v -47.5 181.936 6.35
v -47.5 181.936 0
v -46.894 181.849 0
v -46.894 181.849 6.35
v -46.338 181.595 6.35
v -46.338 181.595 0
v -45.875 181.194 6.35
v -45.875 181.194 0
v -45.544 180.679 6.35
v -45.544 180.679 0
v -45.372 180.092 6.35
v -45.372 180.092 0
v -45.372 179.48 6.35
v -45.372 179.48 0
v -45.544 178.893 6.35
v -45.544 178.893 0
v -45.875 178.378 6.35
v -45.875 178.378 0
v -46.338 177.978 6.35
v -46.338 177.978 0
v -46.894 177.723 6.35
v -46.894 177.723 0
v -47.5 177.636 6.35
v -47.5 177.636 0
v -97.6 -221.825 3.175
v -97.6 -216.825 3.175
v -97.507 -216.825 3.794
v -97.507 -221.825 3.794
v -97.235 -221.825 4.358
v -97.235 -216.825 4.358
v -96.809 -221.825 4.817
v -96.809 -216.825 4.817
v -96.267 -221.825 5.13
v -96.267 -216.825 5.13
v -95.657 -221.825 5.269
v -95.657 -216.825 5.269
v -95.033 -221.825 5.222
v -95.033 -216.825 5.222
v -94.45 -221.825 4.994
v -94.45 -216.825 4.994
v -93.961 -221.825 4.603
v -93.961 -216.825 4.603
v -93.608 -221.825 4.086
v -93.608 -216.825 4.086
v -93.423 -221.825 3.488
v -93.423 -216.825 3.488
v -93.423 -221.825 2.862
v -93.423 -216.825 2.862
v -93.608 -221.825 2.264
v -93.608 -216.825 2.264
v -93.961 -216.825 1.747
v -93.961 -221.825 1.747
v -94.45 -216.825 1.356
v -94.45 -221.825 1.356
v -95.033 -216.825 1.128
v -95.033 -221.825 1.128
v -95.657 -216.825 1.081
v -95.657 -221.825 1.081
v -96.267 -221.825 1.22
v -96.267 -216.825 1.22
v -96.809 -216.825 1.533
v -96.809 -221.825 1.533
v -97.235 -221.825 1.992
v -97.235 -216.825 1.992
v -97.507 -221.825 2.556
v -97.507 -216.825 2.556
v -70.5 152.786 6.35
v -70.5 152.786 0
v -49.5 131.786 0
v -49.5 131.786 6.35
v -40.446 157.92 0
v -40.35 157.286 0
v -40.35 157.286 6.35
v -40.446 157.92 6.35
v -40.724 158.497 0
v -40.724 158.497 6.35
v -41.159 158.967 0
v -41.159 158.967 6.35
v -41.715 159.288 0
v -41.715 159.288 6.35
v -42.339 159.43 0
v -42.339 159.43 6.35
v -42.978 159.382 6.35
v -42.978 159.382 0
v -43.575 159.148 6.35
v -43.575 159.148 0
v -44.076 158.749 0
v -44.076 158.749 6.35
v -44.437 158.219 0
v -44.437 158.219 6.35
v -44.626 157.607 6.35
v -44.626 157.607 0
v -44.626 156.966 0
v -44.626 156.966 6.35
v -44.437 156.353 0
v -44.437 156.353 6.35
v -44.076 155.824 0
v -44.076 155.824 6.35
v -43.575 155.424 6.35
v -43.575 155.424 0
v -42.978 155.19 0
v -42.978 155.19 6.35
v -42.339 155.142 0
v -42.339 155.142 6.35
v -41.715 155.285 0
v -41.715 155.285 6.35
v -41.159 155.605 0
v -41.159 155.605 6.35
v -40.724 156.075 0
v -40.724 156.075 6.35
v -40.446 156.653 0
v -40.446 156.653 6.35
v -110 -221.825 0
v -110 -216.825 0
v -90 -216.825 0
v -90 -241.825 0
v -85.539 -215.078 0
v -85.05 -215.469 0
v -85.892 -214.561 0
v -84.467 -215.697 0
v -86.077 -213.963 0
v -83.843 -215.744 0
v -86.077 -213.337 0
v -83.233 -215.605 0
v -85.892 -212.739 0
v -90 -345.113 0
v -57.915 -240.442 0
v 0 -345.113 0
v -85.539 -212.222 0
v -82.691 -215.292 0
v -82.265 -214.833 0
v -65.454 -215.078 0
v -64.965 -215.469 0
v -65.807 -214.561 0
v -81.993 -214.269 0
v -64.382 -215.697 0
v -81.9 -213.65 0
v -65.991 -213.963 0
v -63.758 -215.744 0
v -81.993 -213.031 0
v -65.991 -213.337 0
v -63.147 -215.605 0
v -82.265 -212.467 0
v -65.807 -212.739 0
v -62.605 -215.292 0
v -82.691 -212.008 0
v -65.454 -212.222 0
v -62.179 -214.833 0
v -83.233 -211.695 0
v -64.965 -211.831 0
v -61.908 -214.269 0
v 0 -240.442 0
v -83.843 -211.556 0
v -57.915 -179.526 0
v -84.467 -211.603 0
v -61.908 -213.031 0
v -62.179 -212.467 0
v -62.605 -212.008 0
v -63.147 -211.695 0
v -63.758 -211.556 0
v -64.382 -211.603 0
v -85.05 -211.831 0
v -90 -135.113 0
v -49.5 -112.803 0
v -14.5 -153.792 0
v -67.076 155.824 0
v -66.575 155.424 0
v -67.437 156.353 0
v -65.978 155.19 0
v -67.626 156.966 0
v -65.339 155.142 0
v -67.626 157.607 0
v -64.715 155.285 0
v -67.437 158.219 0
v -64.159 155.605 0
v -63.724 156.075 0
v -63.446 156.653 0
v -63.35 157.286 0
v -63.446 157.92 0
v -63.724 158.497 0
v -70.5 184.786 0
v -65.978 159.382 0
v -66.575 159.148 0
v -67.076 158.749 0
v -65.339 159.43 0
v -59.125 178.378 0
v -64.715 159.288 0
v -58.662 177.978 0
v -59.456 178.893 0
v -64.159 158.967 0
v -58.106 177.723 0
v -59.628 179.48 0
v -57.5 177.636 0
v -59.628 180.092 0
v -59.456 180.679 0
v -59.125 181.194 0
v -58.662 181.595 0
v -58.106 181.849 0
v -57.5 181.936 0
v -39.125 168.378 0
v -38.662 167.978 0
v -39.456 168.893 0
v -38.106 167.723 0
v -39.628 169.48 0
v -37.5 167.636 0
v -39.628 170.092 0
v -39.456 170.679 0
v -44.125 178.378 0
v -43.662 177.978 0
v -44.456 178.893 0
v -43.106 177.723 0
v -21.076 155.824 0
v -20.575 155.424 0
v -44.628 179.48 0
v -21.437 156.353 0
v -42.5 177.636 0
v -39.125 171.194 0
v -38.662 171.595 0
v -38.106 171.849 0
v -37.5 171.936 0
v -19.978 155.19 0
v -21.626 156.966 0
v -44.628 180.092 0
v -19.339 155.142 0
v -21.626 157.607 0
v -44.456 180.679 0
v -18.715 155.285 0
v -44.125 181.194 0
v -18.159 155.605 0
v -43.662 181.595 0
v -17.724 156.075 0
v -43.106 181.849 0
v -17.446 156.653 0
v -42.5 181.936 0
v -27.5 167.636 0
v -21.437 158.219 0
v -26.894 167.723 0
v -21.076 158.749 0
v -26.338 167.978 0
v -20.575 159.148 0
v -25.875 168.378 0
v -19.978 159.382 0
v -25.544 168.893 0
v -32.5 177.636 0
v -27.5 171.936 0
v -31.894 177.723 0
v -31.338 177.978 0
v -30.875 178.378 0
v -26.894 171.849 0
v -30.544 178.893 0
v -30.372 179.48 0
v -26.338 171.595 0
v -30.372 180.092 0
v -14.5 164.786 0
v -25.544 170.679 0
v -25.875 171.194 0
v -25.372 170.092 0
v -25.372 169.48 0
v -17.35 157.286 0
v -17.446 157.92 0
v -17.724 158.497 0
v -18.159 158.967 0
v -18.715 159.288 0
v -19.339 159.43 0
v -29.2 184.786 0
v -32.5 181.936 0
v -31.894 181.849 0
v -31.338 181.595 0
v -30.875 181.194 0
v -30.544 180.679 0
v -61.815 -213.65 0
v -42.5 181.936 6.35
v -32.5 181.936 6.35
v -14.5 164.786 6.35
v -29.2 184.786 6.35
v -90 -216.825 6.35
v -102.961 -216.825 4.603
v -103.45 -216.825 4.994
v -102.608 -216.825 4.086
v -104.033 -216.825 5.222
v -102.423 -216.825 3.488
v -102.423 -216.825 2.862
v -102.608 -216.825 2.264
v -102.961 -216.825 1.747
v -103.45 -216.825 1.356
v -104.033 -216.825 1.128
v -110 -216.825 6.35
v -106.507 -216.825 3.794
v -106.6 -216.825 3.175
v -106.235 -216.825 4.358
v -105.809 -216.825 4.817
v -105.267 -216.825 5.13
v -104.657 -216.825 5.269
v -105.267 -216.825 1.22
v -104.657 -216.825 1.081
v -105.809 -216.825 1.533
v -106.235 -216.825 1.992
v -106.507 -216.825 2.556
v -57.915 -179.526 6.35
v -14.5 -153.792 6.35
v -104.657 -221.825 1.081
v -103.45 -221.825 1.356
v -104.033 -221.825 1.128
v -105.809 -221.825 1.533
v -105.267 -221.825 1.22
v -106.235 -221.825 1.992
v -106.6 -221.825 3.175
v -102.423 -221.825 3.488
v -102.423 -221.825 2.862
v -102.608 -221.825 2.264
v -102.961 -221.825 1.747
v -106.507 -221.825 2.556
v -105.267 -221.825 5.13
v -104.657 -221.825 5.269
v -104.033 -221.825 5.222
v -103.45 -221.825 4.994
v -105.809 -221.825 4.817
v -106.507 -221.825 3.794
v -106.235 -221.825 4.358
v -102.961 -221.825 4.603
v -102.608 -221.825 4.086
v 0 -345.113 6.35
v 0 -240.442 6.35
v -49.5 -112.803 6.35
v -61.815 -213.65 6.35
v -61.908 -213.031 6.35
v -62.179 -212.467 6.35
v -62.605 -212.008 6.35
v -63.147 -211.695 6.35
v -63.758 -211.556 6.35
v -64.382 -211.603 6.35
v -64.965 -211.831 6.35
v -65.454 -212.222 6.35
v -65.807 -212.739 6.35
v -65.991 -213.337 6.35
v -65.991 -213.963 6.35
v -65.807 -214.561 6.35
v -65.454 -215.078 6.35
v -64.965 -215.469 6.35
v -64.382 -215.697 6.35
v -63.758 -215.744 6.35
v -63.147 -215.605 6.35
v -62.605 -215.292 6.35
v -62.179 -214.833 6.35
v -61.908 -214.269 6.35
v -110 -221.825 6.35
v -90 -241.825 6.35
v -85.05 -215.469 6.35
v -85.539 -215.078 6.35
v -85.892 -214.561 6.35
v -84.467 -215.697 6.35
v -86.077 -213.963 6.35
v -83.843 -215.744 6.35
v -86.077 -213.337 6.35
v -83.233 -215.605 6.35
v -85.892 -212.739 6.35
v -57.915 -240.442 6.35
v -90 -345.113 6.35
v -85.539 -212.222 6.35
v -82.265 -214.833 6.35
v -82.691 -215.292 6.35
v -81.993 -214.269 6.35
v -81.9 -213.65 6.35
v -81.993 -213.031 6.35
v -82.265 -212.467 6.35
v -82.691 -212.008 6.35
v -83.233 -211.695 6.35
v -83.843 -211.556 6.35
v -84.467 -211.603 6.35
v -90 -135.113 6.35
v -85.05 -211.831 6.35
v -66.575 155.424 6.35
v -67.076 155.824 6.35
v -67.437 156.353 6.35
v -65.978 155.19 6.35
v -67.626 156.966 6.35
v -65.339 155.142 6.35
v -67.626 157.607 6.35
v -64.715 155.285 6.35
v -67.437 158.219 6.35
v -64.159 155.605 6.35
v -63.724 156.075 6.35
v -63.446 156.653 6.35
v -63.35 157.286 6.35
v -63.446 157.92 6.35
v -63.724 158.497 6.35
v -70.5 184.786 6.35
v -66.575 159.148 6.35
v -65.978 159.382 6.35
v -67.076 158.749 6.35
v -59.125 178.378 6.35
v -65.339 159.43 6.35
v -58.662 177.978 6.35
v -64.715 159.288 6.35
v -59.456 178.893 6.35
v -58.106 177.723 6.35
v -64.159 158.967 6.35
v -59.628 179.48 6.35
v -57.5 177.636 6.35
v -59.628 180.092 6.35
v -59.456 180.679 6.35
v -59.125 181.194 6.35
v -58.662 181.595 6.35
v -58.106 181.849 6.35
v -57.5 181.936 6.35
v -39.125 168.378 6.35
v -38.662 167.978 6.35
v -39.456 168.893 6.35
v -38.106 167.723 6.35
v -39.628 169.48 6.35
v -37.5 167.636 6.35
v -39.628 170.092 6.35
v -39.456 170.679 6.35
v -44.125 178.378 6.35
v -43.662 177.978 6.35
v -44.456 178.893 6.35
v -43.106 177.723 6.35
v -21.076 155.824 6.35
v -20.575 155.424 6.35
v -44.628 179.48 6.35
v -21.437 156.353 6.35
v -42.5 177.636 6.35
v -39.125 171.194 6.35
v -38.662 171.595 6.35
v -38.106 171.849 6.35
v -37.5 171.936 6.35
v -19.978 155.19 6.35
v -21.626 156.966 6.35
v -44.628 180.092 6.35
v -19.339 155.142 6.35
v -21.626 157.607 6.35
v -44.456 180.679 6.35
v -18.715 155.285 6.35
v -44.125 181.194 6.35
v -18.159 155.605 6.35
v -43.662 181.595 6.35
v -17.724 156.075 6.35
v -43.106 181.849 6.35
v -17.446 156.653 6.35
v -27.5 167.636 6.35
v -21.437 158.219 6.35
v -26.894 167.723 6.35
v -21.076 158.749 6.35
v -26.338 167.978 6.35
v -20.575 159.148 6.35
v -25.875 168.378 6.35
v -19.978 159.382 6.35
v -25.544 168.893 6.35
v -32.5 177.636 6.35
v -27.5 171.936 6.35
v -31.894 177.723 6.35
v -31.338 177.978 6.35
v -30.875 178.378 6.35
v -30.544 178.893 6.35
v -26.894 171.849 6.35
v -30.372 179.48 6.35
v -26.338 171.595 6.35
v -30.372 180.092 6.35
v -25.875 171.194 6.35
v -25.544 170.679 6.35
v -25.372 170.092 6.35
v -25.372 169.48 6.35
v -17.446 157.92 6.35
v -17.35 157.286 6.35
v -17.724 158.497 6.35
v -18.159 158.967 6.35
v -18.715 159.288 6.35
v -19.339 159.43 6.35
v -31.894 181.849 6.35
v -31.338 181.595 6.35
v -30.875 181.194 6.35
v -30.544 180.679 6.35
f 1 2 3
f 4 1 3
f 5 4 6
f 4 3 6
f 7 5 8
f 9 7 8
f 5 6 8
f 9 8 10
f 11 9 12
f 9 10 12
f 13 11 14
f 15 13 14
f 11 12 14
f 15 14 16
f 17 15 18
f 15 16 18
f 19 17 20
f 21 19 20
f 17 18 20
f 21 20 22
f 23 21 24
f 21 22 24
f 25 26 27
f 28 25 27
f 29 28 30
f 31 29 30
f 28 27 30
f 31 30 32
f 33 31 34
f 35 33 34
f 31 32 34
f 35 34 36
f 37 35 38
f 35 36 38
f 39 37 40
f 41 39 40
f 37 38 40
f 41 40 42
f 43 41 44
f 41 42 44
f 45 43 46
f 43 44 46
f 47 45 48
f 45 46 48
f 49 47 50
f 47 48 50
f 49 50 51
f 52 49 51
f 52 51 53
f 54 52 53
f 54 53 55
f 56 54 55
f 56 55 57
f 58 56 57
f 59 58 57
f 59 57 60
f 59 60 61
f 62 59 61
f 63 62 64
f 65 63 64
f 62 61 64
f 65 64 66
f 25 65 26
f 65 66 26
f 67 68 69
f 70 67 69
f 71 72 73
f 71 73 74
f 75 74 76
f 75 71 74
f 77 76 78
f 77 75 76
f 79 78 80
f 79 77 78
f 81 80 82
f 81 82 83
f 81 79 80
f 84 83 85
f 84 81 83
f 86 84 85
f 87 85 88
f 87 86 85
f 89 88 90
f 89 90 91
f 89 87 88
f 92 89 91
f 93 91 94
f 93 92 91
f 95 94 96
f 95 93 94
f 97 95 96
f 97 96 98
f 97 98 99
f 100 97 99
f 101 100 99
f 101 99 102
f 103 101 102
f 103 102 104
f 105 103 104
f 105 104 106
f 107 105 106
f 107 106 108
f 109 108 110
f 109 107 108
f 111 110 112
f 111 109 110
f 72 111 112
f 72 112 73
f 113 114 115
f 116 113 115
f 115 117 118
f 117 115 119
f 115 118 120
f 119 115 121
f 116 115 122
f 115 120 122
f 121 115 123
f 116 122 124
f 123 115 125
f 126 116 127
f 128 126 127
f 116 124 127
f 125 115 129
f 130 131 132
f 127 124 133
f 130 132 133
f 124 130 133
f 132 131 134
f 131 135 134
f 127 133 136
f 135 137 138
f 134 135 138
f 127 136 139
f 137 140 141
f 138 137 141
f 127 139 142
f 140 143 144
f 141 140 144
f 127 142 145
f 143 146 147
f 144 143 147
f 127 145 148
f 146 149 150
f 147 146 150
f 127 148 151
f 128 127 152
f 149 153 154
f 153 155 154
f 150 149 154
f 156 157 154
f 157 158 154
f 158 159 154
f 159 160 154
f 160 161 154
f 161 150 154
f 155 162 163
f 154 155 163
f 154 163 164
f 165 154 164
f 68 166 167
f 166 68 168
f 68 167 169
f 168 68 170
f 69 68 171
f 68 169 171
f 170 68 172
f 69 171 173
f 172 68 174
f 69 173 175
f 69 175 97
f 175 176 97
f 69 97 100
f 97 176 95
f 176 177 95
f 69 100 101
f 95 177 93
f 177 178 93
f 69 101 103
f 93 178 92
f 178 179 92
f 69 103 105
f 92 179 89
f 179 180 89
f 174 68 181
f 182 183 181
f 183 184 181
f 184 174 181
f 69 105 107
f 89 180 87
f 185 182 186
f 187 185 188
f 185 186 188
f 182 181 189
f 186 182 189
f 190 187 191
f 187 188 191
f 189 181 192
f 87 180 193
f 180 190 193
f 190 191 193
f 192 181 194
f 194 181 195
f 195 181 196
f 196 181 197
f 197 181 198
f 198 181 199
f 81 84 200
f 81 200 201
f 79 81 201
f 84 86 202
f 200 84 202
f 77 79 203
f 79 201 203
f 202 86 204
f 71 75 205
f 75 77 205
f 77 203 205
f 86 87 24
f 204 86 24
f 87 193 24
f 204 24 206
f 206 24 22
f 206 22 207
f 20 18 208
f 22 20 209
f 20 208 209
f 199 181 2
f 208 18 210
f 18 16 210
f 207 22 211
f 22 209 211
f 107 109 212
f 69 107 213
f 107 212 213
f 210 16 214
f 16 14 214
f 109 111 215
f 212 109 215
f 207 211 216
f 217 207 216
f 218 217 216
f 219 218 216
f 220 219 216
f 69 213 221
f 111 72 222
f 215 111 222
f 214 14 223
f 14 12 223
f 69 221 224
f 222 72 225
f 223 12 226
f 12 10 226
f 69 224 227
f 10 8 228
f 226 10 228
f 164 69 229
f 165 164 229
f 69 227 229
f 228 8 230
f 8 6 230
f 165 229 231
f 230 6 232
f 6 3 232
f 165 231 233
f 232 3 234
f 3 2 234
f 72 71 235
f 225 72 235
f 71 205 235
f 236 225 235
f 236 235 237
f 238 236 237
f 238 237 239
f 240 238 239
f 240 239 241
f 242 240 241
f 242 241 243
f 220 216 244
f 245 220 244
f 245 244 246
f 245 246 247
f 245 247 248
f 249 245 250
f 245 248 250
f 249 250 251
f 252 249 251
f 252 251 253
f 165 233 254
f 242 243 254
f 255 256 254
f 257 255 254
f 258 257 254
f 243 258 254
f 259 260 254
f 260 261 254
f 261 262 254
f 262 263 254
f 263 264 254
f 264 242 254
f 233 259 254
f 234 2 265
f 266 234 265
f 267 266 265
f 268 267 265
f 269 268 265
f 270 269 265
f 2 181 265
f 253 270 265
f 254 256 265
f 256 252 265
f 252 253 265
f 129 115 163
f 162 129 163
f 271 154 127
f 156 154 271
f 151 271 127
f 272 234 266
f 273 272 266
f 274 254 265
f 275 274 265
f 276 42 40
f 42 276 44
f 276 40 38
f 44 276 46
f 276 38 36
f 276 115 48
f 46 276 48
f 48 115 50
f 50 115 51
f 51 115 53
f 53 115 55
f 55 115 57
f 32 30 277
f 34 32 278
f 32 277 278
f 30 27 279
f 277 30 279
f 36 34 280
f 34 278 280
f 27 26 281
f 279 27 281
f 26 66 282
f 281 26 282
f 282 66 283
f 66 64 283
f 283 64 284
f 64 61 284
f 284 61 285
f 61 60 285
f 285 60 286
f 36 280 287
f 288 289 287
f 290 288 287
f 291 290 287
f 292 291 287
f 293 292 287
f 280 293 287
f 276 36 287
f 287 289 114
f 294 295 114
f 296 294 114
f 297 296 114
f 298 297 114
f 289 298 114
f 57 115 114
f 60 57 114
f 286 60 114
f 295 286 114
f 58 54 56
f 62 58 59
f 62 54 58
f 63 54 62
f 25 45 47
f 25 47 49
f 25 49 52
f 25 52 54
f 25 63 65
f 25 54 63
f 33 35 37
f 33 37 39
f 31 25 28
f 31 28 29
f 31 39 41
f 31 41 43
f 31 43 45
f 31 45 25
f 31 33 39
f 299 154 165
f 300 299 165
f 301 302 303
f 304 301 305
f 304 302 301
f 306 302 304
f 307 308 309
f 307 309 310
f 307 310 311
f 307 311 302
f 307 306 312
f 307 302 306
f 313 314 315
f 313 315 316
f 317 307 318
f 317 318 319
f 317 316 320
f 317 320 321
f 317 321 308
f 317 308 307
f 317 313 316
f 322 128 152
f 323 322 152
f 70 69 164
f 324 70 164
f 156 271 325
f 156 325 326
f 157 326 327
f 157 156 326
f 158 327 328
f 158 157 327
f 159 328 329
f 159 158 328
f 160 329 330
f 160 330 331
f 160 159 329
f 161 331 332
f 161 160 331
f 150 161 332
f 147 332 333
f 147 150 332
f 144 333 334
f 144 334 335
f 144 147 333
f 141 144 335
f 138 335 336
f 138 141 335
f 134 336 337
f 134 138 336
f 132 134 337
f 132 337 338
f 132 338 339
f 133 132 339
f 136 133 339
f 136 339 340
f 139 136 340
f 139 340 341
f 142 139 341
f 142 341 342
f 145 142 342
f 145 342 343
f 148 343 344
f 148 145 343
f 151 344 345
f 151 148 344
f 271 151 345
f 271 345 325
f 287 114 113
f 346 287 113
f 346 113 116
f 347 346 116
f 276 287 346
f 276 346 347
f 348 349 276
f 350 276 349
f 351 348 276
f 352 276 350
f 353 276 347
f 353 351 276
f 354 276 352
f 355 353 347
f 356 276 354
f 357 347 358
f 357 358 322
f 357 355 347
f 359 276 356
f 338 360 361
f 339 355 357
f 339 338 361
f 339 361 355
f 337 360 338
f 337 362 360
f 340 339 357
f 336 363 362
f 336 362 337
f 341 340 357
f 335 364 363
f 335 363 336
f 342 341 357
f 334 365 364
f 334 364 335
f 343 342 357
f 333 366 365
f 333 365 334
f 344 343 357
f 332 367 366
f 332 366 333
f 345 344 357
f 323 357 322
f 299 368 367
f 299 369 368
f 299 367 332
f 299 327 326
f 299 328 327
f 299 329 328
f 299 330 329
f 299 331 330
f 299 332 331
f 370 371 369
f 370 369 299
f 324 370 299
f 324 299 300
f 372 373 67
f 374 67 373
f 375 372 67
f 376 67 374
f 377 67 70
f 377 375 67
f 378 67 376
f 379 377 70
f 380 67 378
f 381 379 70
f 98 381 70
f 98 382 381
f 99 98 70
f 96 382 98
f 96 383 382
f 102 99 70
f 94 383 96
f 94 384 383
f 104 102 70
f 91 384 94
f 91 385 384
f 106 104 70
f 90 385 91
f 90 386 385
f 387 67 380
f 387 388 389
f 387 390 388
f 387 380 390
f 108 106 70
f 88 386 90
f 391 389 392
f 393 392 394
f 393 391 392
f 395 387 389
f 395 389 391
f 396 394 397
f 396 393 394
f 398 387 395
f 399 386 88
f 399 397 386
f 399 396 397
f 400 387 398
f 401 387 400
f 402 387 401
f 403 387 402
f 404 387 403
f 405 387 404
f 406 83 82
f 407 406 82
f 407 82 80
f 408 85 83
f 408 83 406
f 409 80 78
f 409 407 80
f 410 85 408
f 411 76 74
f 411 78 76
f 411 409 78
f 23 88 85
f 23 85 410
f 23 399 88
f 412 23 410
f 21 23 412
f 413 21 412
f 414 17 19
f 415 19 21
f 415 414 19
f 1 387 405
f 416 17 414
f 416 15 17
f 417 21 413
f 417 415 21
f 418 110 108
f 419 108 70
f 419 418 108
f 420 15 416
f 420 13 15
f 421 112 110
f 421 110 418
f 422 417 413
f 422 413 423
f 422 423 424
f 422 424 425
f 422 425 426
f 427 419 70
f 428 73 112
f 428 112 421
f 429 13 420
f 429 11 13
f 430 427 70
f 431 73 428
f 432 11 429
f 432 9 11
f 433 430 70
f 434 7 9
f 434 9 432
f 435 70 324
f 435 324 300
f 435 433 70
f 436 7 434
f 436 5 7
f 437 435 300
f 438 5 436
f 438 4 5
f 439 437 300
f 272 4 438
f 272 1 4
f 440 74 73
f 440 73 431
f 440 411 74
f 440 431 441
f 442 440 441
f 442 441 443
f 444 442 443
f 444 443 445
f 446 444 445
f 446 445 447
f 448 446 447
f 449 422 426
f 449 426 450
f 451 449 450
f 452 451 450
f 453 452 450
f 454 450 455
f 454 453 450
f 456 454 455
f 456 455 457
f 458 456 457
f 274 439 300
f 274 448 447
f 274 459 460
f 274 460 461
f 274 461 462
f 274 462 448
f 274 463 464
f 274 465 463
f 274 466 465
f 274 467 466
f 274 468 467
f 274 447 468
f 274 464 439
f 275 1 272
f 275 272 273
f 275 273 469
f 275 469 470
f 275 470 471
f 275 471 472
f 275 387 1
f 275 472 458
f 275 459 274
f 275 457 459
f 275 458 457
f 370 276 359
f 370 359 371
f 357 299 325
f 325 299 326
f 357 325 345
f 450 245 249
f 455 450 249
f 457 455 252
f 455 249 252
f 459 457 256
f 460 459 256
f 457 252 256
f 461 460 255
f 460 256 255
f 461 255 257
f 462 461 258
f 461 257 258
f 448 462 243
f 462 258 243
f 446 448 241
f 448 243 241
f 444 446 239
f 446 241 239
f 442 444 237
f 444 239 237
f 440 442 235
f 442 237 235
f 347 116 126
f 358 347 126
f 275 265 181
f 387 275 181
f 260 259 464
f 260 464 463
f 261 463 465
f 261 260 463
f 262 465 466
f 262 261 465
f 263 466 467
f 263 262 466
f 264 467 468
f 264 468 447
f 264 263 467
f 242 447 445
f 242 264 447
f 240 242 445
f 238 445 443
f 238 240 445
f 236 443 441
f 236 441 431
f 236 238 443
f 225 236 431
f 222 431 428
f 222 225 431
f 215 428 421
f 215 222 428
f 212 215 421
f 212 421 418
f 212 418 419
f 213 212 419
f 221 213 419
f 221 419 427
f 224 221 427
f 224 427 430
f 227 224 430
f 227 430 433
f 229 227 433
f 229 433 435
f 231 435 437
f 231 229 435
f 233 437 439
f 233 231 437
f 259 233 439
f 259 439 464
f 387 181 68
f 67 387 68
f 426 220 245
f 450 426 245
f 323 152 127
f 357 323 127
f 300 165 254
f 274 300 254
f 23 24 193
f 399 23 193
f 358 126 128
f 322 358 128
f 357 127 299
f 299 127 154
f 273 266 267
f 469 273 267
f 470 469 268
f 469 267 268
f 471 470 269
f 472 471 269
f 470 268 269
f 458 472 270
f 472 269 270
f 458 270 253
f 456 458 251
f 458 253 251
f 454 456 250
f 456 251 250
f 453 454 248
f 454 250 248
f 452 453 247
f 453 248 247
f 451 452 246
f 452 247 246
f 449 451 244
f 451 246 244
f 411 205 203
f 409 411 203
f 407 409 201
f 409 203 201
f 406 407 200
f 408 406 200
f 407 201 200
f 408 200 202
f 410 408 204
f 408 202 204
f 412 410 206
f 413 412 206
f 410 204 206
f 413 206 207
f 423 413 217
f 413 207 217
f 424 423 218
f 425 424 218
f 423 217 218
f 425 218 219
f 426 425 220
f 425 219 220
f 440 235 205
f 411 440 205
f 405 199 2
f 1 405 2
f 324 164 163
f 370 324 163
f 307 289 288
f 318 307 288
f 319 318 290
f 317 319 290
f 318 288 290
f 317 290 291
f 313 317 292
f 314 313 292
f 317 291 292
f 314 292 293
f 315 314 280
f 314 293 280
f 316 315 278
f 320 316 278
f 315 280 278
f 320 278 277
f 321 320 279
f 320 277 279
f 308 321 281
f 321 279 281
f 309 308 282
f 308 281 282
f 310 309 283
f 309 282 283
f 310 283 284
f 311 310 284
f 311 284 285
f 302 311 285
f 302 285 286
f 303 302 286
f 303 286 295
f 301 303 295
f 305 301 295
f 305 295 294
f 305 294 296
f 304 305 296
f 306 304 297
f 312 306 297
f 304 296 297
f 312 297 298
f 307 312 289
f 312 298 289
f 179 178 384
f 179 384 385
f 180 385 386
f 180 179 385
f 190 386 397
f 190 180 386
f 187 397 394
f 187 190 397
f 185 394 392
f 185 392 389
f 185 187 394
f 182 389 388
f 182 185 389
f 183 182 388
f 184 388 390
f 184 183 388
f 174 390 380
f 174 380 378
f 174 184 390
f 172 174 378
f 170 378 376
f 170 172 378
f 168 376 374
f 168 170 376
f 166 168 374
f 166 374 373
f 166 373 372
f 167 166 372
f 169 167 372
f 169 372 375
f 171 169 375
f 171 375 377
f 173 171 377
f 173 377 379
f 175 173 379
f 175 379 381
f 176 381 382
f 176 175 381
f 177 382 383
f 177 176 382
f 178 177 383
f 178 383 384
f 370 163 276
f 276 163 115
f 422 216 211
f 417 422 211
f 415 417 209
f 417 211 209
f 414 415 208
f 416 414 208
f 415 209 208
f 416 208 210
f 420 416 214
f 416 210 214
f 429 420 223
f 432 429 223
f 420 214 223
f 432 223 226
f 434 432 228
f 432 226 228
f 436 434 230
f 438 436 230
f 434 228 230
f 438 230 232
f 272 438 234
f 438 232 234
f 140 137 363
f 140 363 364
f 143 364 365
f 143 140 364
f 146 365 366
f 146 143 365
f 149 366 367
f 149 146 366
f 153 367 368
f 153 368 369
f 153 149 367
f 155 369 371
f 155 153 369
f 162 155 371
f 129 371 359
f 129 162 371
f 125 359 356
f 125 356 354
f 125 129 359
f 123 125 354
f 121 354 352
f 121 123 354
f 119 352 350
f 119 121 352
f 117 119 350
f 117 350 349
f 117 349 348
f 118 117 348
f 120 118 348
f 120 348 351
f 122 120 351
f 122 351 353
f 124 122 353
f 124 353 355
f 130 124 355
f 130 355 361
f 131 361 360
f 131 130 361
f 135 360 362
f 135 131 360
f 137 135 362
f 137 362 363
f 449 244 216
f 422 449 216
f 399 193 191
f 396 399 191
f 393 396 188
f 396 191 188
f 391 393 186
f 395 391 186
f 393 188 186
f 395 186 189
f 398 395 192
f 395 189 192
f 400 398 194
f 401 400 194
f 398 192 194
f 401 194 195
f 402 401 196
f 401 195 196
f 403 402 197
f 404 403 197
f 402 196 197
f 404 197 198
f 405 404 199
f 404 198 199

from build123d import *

# Parameters (mm, degrees)
SKETCH1_R           = 2.15
SKETCH1_R_2         = 2.1
BOSS_EXTRUDE1_DEPTH = 6.35
SKETCH2_R           = 2.1
CUT_EXTRUDE1_DEPTH  = 5


with BuildPart() as part:
    # Sketch1 → Boss-Extrude1 (new body)
    with BuildSketch(Plane.XY):
        Polygon((-14.5, 164.786291501), (-29.2, 184.786291501), (-70.5, 184.786291501), (-70.5, 152.786291501), (-49.5, 131.786291501), (-49.5, -112.803421473), (-90, -135.112557197), (-90, -216.825), (-110, -216.825), (-110, -221.825), (-90, -241.825), (-90, -345.112557197), (0, -345.112557197), (0, -240.441757757), (-57.914505889, -240.441757757), (-57.914505889, -179.526253392), (-14.5, -153.791774149), align=None)
        with Locations((-19.5, 157.286291501)):
            Circle(SKETCH1_R, mode=Mode.SUBTRACT)
        with Locations((-42.5, 157.286291501)):
            Circle(SKETCH1_R, mode=Mode.SUBTRACT)
        with Locations((-65.5, 157.286291501)):
            Circle(SKETCH1_R, mode=Mode.SUBTRACT)
        with Locations((-84, -213.65)):
            Circle(SKETCH1_R_2, mode=Mode.SUBTRACT)
        with Locations((-63.914505889, -213.65)):
            Circle(SKETCH1_R_2, mode=Mode.SUBTRACT)
        with BuildLine():
            Line((-42.5, 181.936291501), (-32.5, 181.936291501))
            ThreePointArc((-32.5, 181.936291501), (-30.35, 179.786291501), (-32.5, 177.636291501))
            Line((-32.5, 177.636291501), (-42.5, 177.636291501))
            ThreePointArc((-42.5, 177.636291501), (-44.65, 179.786291501), (-42.5, 181.936291501))
        make_face(mode=Mode.SUBTRACT)
        with BuildLine():
            Line((-57.5, 181.936291501), (-47.5, 181.936291501))
            ThreePointArc((-47.5, 181.936291501), (-45.35, 179.786291501), (-47.5, 177.636291501))
            Line((-47.5, 177.636291501), (-57.5, 177.636291501))
            ThreePointArc((-57.5, 177.636291501), (-59.65, 179.786291501), (-57.5, 181.936291501))
        make_face(mode=Mode.SUBTRACT)
        with BuildLine():
            Line((-37.5, 171.936291501), (-27.5, 171.936291501))
            ThreePointArc((-27.5, 171.936291501), (-25.35, 169.786291501), (-27.5, 167.636291501))
            Line((-27.5, 167.636291501), (-37.5, 167.636291501))
            ThreePointArc((-37.5, 167.636291501), (-39.65, 169.786291501), (-37.5, 171.936291501))
        make_face(mode=Mode.SUBTRACT)
    extrude(amount=BOSS_EXTRUDE1_DEPTH)

    # Sketch2 → Cut-Extrude1 (cut)
    with BuildSketch(Plane(origin=(0, -216.825, 0), x_dir=(-1, 0, 0), z_dir=(0, 1, 0))):
        with Locations((95.5, 3.175)):
            Circle(SKETCH2_R)
        with Locations((104.5, 3.175)):
            Circle(SKETCH2_R)
    extrude(amount=-CUT_EXTRUDE1_DEPTH, mode=Mode.SUBTRACT)


solid = part.part
